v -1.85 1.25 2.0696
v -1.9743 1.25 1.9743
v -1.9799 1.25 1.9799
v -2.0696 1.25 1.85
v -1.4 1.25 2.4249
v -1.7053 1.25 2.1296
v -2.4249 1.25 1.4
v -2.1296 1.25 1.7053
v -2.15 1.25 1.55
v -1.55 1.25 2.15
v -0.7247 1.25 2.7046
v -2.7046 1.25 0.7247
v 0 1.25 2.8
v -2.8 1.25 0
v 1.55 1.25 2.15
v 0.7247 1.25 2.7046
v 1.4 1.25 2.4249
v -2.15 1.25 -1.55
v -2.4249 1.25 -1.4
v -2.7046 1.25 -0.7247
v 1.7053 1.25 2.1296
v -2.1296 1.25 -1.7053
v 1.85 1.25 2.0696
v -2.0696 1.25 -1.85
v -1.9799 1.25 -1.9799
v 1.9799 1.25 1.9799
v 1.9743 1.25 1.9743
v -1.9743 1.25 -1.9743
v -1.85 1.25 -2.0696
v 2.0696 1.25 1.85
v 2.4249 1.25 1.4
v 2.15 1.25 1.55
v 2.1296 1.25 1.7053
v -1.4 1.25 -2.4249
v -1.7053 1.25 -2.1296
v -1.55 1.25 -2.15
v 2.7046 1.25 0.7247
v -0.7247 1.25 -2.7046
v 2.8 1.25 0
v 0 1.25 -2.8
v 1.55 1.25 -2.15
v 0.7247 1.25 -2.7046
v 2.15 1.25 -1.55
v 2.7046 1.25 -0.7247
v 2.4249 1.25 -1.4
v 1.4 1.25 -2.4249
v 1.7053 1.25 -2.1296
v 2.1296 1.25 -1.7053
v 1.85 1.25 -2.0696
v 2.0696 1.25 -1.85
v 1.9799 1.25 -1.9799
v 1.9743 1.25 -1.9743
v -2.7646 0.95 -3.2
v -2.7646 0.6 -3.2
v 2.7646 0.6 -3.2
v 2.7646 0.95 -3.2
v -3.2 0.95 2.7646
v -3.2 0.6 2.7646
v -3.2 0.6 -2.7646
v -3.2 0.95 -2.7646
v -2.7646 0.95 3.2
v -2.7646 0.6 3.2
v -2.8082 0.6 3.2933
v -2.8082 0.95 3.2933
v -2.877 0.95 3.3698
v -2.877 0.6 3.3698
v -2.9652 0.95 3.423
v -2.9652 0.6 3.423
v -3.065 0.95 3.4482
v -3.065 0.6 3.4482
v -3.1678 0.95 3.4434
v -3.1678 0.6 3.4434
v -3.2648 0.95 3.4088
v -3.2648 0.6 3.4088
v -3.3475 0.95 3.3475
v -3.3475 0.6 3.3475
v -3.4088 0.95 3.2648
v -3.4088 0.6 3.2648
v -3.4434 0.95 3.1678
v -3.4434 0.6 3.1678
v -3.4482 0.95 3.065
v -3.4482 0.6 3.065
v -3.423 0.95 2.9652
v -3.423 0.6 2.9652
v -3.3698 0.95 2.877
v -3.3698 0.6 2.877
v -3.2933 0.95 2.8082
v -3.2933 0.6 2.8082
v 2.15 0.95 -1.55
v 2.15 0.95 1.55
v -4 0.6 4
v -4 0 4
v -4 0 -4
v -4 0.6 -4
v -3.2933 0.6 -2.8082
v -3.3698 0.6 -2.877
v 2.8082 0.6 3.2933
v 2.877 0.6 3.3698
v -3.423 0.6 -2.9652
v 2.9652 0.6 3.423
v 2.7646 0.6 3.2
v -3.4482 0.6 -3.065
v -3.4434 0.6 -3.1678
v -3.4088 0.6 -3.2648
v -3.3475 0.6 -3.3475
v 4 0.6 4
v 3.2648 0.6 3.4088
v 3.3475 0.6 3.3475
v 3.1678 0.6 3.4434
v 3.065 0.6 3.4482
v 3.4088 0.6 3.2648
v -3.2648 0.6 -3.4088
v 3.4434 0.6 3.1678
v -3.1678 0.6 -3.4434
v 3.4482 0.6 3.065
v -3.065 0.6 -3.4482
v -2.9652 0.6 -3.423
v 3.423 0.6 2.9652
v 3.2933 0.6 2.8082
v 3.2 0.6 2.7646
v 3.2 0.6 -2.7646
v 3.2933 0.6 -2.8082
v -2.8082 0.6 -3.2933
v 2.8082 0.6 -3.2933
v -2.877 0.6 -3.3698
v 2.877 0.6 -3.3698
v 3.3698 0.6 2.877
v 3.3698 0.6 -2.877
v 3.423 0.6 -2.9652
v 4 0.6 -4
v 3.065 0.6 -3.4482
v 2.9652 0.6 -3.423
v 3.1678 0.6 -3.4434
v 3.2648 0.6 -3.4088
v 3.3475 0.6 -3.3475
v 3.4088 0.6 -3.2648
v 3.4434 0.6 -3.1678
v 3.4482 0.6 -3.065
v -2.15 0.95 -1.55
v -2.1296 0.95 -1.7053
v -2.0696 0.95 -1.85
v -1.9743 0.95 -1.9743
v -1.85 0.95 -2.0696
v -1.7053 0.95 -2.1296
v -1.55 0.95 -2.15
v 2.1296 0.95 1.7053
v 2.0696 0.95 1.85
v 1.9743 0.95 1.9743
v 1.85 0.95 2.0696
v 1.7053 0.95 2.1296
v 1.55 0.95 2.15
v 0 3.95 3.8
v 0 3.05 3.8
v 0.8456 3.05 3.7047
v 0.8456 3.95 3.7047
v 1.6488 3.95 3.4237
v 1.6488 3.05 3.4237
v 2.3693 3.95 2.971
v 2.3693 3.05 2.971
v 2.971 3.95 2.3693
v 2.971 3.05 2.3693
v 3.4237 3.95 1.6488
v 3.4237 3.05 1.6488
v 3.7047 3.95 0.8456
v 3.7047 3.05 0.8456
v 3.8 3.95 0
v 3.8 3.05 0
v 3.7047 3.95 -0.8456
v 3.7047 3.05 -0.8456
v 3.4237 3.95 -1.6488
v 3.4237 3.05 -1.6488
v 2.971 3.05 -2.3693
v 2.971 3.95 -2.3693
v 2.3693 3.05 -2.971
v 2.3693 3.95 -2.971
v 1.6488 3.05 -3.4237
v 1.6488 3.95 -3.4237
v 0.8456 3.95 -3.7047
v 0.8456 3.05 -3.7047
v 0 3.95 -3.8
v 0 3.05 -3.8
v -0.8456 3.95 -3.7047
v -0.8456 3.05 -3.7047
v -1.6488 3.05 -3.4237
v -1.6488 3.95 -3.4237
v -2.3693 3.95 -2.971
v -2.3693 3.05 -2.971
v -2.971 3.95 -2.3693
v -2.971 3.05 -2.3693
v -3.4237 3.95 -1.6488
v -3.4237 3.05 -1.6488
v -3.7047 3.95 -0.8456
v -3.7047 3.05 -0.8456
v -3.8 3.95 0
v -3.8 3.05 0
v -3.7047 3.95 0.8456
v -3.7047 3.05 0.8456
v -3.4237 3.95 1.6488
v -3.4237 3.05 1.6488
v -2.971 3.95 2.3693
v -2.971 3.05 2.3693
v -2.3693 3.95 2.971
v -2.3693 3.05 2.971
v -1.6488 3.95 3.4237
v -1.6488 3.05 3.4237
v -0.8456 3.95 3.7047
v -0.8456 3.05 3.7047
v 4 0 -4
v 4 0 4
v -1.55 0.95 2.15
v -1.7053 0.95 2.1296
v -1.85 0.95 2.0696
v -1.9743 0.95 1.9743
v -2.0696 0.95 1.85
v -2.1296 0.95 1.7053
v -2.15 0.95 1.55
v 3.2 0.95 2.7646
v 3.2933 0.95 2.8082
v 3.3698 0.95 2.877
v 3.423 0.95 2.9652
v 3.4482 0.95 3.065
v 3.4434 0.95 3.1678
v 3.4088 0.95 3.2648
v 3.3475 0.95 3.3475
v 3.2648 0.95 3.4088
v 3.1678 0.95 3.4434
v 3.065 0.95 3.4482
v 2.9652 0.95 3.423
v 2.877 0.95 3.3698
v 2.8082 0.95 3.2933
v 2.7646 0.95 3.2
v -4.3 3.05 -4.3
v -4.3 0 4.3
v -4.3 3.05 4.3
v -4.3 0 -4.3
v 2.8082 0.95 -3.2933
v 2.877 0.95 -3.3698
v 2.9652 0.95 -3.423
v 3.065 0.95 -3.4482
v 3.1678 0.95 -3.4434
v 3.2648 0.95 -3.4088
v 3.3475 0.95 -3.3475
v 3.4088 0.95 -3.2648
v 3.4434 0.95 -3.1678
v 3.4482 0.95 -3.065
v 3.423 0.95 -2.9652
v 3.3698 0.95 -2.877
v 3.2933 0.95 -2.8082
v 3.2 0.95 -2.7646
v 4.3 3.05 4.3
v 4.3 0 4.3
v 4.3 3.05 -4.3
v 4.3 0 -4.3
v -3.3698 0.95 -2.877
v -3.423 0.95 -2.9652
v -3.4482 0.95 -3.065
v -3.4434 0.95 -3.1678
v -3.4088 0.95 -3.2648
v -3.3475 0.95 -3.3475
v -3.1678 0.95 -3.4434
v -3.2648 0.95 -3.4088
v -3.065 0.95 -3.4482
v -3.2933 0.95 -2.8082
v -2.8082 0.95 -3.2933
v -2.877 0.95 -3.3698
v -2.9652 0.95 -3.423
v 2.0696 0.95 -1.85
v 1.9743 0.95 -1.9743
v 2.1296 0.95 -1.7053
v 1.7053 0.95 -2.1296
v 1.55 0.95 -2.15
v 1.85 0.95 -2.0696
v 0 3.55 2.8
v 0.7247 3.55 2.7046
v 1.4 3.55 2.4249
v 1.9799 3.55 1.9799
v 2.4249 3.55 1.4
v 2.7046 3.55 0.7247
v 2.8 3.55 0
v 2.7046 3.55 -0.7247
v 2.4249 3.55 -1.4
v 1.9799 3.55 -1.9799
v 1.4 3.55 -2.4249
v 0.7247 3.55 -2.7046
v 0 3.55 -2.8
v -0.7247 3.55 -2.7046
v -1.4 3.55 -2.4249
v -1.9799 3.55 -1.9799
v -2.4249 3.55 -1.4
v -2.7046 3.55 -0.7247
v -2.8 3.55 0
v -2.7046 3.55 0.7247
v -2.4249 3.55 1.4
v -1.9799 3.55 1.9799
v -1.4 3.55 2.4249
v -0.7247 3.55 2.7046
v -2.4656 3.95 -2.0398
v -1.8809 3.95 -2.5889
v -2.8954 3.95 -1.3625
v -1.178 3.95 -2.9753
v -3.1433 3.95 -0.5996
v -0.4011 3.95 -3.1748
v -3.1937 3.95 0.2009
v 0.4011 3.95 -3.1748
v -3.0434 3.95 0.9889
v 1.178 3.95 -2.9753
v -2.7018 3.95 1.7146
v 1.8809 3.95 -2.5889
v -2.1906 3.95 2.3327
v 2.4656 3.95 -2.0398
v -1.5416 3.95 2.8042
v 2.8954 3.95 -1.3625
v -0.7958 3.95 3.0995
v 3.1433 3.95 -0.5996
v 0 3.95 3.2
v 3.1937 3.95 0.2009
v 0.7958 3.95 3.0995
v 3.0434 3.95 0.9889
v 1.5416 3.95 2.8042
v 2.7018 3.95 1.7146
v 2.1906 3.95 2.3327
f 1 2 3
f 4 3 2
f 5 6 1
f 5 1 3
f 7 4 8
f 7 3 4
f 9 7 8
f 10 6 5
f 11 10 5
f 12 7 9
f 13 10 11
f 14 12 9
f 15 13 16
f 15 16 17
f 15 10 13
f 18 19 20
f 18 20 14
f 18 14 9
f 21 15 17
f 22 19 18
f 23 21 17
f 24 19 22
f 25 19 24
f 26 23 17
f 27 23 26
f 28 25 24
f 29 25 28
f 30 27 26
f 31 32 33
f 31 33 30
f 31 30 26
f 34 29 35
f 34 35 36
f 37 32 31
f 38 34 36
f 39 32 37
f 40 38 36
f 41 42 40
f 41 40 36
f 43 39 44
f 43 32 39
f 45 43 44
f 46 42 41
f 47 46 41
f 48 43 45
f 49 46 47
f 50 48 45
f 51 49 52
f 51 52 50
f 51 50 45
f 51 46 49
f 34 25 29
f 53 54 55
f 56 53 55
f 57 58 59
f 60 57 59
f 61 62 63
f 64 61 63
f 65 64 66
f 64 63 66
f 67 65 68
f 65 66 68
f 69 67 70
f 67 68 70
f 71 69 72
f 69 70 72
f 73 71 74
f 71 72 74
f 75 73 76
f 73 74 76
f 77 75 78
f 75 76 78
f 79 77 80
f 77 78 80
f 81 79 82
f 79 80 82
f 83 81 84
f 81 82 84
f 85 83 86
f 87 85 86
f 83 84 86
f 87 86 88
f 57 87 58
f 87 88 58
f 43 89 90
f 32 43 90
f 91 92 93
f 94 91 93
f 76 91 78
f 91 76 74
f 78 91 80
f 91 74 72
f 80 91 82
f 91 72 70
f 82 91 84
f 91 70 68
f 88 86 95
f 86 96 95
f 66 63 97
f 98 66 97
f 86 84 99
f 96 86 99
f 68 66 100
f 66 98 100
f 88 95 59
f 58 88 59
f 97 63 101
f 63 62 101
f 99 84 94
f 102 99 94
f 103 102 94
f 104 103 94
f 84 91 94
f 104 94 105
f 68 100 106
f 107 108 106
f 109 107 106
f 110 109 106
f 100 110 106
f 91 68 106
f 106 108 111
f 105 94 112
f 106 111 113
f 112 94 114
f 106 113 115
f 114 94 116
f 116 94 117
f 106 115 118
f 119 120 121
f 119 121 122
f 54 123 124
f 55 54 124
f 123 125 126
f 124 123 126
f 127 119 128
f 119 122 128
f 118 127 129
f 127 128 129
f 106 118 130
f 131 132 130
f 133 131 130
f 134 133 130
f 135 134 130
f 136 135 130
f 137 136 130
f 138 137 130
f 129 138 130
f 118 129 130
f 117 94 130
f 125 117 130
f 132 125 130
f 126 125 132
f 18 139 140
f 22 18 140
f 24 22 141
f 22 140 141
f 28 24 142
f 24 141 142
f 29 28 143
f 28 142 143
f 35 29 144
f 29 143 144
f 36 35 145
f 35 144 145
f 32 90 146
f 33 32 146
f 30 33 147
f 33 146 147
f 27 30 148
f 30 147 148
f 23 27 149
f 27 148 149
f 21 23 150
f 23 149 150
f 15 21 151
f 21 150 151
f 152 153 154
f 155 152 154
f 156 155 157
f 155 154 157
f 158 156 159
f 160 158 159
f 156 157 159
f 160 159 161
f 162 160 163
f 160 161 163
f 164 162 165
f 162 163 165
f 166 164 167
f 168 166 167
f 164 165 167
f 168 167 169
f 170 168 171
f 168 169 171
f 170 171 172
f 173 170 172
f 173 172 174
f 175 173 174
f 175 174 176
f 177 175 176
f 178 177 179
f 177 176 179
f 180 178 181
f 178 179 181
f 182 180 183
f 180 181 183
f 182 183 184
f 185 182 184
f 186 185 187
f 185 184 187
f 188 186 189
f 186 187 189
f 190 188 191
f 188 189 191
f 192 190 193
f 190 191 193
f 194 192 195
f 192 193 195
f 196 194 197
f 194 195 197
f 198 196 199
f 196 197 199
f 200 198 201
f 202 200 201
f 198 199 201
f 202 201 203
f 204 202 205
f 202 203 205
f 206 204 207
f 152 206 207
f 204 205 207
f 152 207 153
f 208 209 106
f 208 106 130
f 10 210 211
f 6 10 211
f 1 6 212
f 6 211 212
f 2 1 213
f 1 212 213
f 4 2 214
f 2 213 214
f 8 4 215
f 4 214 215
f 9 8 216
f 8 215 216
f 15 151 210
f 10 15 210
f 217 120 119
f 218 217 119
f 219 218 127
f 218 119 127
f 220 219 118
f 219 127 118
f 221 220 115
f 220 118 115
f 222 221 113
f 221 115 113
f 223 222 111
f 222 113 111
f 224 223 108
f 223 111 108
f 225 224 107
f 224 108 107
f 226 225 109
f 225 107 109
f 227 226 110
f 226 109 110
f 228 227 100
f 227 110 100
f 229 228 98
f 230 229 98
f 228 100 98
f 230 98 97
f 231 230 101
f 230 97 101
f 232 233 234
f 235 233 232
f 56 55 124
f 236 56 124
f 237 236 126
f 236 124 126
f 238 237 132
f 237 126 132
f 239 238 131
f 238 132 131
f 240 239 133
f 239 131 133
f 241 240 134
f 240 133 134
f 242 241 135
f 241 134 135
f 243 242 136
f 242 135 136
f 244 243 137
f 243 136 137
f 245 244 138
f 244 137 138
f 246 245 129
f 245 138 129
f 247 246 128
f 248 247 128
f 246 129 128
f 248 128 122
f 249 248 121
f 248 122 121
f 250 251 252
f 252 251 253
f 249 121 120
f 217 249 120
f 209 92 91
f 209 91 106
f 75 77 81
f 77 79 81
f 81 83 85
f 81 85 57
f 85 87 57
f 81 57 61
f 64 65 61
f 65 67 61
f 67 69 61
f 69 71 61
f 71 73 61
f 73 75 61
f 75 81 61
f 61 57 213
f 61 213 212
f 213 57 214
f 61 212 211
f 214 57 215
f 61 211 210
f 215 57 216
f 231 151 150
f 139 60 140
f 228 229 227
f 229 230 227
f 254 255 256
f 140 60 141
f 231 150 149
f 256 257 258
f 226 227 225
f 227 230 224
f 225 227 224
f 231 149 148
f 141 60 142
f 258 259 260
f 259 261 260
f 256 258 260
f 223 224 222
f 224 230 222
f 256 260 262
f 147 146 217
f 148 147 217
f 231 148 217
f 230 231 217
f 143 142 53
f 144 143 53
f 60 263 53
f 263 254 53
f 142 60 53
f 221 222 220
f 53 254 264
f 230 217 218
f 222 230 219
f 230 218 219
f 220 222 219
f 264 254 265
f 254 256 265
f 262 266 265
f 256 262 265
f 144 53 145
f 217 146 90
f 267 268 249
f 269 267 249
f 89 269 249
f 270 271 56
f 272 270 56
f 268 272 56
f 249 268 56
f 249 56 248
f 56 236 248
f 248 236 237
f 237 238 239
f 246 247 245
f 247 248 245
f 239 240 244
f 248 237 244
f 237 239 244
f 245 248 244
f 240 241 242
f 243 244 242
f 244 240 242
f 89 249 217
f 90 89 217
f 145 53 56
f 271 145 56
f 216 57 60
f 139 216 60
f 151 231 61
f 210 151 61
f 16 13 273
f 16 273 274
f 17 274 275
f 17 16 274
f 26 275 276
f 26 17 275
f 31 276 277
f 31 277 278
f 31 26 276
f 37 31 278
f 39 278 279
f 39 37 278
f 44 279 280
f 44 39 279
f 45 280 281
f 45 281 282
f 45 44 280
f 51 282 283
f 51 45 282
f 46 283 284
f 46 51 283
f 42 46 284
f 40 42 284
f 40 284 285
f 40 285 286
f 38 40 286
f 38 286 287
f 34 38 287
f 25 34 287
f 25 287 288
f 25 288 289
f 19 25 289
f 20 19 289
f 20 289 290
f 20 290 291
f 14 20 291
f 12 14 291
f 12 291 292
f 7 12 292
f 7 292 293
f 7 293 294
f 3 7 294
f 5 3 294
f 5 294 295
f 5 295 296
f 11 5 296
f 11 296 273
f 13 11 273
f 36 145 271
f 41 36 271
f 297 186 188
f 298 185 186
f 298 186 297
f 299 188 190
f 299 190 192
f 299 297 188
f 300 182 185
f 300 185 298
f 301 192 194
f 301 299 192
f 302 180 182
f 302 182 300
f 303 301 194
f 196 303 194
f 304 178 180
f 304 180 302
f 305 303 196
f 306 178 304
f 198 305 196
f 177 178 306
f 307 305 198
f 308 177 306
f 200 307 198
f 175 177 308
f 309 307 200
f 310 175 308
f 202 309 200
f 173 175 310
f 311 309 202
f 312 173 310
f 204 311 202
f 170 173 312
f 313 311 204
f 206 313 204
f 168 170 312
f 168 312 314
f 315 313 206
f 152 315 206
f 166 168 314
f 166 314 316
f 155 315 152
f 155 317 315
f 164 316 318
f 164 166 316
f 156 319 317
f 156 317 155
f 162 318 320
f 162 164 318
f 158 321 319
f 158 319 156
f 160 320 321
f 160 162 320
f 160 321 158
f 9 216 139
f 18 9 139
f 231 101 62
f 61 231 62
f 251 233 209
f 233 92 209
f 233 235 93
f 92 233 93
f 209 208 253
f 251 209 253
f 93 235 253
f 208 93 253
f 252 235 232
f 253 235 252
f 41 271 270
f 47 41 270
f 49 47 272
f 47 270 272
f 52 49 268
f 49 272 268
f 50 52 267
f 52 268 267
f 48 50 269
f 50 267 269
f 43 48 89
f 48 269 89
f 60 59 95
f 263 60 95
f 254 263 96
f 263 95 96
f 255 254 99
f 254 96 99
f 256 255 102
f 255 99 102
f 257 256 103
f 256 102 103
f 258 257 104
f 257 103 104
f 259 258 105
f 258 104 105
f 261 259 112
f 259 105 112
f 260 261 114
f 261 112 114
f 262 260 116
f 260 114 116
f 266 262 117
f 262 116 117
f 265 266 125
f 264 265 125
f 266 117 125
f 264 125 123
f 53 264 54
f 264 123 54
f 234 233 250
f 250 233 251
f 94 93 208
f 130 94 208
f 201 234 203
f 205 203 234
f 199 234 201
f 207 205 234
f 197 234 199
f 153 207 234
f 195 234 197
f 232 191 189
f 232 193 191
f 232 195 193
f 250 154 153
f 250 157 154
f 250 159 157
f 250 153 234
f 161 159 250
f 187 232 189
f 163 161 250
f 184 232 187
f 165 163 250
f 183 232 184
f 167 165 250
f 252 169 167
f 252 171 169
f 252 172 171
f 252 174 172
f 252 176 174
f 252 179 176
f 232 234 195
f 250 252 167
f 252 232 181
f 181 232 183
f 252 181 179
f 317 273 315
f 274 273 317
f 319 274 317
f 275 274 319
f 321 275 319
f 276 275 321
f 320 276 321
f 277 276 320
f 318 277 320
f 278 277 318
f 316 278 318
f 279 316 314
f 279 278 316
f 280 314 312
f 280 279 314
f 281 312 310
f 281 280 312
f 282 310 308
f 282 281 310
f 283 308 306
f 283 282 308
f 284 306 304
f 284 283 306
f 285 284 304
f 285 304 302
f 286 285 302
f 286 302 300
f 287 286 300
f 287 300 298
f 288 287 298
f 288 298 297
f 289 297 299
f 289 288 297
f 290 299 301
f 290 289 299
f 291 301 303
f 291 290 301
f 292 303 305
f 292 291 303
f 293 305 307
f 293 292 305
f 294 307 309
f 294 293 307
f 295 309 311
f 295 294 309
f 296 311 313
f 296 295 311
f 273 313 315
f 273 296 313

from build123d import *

# Parameters (mm, degrees)
SKIZZE2_W                       = 8.6
SKIZZE2_H                       = 8.6
SKIZZE2_W_2                     = 8
SKIZZE2_H_2                     = 8
AUFSATZ_LINEAR_AUSTRAGEN1_DEPTH = 0.6
SKIZZE5_W                       = 8.6
SKIZZE5_H                       = 8.6
AUFSATZ_LINEAR_AUSTRAGEN3_DEPTH = 0.35
SKIZZE4_W                       = 8.6
SKIZZE4_H                       = 8.6
AUFSATZ_LINEAR_AUSTRAGEN2_DEPTH = 0.3
SKIZZE7_W                       = 8.6
SKIZZE7_H                       = 8.6
SKIZZE7_R                       = 2.8
AUFSATZ_LINEAR_AUSTRAGEN4_DEPTH = 1.8
SKIZZE8_R                       = 3.8
SKIZZE8_R_2                     = 2.8
AUFSATZ_LINEAR_AUSTRAGEN5_DEPTH = 0.9
FASE1_SIZE                      = 0.4


with BuildPart() as part:
    # Skizze2 → Aufsatz-Linear austragen1 (new body)
    with BuildSketch(Plane(origin=(0, 0, 0), x_dir=(1, 0, 0), z_dir=(0, 1, 0))):
        Rectangle(SKIZZE2_W, SKIZZE2_H)
        Rectangle(SKIZZE2_W_2, SKIZZE2_H_2, mode=Mode.SUBTRACT)
    extrude(amount=AUFSATZ_LINEAR_AUSTRAGEN1_DEPTH)

    # Skizze5 → Aufsatz-Linear austragen3 (add)
    with BuildSketch(Plane(origin=(0, 0.6, 0), x_dir=(1, 0, 0), z_dir=(0, 1, 0))):
        Rectangle(SKIZZE5_W, SKIZZE5_H)
        with BuildLine():
            Line((-2.764589803, 3.2), (2.764589803, 3.2))
            ThreePointArc((2.764589803, 3.2), (3.347487373, 3.347487373), (3.2, 2.764589803))
            Line((3.2, 2.764589803), (3.2, -2.764589803))
            ThreePointArc((3.2, -2.764589803), (3.347487373, -3.347487373), (2.764589803, -3.2))
            Line((2.764589803, -3.2), (-2.764589803, -3.2))
            ThreePointArc((-2.764589803, -3.2), (-3.347487373, -3.347487373), (-3.2, -2.764589803))
            Line((-3.2, -2.764589803), (-3.2, 2.764589803))
            ThreePointArc((-3.2, 2.764589803), (-3.347487373, 3.347487373), (-2.764589803, 3.2))
        make_face(mode=Mode.SUBTRACT)
    extrude(amount=AUFSATZ_LINEAR_AUSTRAGEN3_DEPTH)

    # Skizze4 → Aufsatz-Linear austragen2 (add)
    with BuildSketch(Plane(origin=(0, 0.95, 0), x_dir=(1, 0, 0), z_dir=(0, 1, 0))):
        Rectangle(SKIZZE4_W, SKIZZE4_H)
        with BuildLine():
            Line((-1.55, 2.15), (1.55, 2.15))
            ThreePointArc((1.55, 2.15), (1.974264069, 1.974264069), (2.15, 1.55))
            Line((2.15, 1.55), (2.15, -1.55))
            ThreePointArc((2.15, -1.55), (1.974264069, -1.974264069), (1.55, -2.15))
            Line((1.55, -2.15), (-1.55, -2.15))
            ThreePointArc((-1.55, -2.15), (-1.974264069, -1.974264069), (-2.15, -1.55))
            Line((-2.15, -1.55), (-2.15, 1.55))
            ThreePointArc((-2.15, 1.55), (-1.974264069, 1.974264069), (-1.55, 2.15))
        make_face(mode=Mode.SUBTRACT)
    extrude(amount=AUFSATZ_LINEAR_AUSTRAGEN2_DEPTH)

    # Skizze7 → Aufsatz-Linear austragen4 (add)
    with BuildSketch(Plane(origin=(0, 1.25, 0), x_dir=(1, 0, 0), z_dir=(0, 1, 0))):
        Rectangle(SKIZZE7_W, SKIZZE7_H)
        with Locations(Location((0, 0, 0), (0, 0, 270))):
            Circle(SKIZZE7_R, mode=Mode.SUBTRACT)
    extrude(amount=AUFSATZ_LINEAR_AUSTRAGEN4_DEPTH)

    # Skizze8 → Aufsatz-Linear austragen5 (add)
    with BuildSketch(Plane(origin=(0, 3.05, 0), x_dir=(1, 0, 0), z_dir=(0, 1, 0))):
        with Locations(Location((0, 0, 0), (0, 0, 270))):
            Circle(SKIZZE8_R)
        with Locations(Location((0, 0, 0), (0, 0, 270))):
            Circle(SKIZZE8_R_2, mode=Mode.SUBTRACT)
    extrude(amount=AUFSATZ_LINEAR_AUSTRAGEN5_DEPTH)

    # Fase1
    fase1_edges = [part.edges().sort_by_distance(p)[0] for p in [
        (0, 3.95, -2.8),
    ]]
    chamfer(fase1_edges, length=FASE1_SIZE)


solid = part.part
